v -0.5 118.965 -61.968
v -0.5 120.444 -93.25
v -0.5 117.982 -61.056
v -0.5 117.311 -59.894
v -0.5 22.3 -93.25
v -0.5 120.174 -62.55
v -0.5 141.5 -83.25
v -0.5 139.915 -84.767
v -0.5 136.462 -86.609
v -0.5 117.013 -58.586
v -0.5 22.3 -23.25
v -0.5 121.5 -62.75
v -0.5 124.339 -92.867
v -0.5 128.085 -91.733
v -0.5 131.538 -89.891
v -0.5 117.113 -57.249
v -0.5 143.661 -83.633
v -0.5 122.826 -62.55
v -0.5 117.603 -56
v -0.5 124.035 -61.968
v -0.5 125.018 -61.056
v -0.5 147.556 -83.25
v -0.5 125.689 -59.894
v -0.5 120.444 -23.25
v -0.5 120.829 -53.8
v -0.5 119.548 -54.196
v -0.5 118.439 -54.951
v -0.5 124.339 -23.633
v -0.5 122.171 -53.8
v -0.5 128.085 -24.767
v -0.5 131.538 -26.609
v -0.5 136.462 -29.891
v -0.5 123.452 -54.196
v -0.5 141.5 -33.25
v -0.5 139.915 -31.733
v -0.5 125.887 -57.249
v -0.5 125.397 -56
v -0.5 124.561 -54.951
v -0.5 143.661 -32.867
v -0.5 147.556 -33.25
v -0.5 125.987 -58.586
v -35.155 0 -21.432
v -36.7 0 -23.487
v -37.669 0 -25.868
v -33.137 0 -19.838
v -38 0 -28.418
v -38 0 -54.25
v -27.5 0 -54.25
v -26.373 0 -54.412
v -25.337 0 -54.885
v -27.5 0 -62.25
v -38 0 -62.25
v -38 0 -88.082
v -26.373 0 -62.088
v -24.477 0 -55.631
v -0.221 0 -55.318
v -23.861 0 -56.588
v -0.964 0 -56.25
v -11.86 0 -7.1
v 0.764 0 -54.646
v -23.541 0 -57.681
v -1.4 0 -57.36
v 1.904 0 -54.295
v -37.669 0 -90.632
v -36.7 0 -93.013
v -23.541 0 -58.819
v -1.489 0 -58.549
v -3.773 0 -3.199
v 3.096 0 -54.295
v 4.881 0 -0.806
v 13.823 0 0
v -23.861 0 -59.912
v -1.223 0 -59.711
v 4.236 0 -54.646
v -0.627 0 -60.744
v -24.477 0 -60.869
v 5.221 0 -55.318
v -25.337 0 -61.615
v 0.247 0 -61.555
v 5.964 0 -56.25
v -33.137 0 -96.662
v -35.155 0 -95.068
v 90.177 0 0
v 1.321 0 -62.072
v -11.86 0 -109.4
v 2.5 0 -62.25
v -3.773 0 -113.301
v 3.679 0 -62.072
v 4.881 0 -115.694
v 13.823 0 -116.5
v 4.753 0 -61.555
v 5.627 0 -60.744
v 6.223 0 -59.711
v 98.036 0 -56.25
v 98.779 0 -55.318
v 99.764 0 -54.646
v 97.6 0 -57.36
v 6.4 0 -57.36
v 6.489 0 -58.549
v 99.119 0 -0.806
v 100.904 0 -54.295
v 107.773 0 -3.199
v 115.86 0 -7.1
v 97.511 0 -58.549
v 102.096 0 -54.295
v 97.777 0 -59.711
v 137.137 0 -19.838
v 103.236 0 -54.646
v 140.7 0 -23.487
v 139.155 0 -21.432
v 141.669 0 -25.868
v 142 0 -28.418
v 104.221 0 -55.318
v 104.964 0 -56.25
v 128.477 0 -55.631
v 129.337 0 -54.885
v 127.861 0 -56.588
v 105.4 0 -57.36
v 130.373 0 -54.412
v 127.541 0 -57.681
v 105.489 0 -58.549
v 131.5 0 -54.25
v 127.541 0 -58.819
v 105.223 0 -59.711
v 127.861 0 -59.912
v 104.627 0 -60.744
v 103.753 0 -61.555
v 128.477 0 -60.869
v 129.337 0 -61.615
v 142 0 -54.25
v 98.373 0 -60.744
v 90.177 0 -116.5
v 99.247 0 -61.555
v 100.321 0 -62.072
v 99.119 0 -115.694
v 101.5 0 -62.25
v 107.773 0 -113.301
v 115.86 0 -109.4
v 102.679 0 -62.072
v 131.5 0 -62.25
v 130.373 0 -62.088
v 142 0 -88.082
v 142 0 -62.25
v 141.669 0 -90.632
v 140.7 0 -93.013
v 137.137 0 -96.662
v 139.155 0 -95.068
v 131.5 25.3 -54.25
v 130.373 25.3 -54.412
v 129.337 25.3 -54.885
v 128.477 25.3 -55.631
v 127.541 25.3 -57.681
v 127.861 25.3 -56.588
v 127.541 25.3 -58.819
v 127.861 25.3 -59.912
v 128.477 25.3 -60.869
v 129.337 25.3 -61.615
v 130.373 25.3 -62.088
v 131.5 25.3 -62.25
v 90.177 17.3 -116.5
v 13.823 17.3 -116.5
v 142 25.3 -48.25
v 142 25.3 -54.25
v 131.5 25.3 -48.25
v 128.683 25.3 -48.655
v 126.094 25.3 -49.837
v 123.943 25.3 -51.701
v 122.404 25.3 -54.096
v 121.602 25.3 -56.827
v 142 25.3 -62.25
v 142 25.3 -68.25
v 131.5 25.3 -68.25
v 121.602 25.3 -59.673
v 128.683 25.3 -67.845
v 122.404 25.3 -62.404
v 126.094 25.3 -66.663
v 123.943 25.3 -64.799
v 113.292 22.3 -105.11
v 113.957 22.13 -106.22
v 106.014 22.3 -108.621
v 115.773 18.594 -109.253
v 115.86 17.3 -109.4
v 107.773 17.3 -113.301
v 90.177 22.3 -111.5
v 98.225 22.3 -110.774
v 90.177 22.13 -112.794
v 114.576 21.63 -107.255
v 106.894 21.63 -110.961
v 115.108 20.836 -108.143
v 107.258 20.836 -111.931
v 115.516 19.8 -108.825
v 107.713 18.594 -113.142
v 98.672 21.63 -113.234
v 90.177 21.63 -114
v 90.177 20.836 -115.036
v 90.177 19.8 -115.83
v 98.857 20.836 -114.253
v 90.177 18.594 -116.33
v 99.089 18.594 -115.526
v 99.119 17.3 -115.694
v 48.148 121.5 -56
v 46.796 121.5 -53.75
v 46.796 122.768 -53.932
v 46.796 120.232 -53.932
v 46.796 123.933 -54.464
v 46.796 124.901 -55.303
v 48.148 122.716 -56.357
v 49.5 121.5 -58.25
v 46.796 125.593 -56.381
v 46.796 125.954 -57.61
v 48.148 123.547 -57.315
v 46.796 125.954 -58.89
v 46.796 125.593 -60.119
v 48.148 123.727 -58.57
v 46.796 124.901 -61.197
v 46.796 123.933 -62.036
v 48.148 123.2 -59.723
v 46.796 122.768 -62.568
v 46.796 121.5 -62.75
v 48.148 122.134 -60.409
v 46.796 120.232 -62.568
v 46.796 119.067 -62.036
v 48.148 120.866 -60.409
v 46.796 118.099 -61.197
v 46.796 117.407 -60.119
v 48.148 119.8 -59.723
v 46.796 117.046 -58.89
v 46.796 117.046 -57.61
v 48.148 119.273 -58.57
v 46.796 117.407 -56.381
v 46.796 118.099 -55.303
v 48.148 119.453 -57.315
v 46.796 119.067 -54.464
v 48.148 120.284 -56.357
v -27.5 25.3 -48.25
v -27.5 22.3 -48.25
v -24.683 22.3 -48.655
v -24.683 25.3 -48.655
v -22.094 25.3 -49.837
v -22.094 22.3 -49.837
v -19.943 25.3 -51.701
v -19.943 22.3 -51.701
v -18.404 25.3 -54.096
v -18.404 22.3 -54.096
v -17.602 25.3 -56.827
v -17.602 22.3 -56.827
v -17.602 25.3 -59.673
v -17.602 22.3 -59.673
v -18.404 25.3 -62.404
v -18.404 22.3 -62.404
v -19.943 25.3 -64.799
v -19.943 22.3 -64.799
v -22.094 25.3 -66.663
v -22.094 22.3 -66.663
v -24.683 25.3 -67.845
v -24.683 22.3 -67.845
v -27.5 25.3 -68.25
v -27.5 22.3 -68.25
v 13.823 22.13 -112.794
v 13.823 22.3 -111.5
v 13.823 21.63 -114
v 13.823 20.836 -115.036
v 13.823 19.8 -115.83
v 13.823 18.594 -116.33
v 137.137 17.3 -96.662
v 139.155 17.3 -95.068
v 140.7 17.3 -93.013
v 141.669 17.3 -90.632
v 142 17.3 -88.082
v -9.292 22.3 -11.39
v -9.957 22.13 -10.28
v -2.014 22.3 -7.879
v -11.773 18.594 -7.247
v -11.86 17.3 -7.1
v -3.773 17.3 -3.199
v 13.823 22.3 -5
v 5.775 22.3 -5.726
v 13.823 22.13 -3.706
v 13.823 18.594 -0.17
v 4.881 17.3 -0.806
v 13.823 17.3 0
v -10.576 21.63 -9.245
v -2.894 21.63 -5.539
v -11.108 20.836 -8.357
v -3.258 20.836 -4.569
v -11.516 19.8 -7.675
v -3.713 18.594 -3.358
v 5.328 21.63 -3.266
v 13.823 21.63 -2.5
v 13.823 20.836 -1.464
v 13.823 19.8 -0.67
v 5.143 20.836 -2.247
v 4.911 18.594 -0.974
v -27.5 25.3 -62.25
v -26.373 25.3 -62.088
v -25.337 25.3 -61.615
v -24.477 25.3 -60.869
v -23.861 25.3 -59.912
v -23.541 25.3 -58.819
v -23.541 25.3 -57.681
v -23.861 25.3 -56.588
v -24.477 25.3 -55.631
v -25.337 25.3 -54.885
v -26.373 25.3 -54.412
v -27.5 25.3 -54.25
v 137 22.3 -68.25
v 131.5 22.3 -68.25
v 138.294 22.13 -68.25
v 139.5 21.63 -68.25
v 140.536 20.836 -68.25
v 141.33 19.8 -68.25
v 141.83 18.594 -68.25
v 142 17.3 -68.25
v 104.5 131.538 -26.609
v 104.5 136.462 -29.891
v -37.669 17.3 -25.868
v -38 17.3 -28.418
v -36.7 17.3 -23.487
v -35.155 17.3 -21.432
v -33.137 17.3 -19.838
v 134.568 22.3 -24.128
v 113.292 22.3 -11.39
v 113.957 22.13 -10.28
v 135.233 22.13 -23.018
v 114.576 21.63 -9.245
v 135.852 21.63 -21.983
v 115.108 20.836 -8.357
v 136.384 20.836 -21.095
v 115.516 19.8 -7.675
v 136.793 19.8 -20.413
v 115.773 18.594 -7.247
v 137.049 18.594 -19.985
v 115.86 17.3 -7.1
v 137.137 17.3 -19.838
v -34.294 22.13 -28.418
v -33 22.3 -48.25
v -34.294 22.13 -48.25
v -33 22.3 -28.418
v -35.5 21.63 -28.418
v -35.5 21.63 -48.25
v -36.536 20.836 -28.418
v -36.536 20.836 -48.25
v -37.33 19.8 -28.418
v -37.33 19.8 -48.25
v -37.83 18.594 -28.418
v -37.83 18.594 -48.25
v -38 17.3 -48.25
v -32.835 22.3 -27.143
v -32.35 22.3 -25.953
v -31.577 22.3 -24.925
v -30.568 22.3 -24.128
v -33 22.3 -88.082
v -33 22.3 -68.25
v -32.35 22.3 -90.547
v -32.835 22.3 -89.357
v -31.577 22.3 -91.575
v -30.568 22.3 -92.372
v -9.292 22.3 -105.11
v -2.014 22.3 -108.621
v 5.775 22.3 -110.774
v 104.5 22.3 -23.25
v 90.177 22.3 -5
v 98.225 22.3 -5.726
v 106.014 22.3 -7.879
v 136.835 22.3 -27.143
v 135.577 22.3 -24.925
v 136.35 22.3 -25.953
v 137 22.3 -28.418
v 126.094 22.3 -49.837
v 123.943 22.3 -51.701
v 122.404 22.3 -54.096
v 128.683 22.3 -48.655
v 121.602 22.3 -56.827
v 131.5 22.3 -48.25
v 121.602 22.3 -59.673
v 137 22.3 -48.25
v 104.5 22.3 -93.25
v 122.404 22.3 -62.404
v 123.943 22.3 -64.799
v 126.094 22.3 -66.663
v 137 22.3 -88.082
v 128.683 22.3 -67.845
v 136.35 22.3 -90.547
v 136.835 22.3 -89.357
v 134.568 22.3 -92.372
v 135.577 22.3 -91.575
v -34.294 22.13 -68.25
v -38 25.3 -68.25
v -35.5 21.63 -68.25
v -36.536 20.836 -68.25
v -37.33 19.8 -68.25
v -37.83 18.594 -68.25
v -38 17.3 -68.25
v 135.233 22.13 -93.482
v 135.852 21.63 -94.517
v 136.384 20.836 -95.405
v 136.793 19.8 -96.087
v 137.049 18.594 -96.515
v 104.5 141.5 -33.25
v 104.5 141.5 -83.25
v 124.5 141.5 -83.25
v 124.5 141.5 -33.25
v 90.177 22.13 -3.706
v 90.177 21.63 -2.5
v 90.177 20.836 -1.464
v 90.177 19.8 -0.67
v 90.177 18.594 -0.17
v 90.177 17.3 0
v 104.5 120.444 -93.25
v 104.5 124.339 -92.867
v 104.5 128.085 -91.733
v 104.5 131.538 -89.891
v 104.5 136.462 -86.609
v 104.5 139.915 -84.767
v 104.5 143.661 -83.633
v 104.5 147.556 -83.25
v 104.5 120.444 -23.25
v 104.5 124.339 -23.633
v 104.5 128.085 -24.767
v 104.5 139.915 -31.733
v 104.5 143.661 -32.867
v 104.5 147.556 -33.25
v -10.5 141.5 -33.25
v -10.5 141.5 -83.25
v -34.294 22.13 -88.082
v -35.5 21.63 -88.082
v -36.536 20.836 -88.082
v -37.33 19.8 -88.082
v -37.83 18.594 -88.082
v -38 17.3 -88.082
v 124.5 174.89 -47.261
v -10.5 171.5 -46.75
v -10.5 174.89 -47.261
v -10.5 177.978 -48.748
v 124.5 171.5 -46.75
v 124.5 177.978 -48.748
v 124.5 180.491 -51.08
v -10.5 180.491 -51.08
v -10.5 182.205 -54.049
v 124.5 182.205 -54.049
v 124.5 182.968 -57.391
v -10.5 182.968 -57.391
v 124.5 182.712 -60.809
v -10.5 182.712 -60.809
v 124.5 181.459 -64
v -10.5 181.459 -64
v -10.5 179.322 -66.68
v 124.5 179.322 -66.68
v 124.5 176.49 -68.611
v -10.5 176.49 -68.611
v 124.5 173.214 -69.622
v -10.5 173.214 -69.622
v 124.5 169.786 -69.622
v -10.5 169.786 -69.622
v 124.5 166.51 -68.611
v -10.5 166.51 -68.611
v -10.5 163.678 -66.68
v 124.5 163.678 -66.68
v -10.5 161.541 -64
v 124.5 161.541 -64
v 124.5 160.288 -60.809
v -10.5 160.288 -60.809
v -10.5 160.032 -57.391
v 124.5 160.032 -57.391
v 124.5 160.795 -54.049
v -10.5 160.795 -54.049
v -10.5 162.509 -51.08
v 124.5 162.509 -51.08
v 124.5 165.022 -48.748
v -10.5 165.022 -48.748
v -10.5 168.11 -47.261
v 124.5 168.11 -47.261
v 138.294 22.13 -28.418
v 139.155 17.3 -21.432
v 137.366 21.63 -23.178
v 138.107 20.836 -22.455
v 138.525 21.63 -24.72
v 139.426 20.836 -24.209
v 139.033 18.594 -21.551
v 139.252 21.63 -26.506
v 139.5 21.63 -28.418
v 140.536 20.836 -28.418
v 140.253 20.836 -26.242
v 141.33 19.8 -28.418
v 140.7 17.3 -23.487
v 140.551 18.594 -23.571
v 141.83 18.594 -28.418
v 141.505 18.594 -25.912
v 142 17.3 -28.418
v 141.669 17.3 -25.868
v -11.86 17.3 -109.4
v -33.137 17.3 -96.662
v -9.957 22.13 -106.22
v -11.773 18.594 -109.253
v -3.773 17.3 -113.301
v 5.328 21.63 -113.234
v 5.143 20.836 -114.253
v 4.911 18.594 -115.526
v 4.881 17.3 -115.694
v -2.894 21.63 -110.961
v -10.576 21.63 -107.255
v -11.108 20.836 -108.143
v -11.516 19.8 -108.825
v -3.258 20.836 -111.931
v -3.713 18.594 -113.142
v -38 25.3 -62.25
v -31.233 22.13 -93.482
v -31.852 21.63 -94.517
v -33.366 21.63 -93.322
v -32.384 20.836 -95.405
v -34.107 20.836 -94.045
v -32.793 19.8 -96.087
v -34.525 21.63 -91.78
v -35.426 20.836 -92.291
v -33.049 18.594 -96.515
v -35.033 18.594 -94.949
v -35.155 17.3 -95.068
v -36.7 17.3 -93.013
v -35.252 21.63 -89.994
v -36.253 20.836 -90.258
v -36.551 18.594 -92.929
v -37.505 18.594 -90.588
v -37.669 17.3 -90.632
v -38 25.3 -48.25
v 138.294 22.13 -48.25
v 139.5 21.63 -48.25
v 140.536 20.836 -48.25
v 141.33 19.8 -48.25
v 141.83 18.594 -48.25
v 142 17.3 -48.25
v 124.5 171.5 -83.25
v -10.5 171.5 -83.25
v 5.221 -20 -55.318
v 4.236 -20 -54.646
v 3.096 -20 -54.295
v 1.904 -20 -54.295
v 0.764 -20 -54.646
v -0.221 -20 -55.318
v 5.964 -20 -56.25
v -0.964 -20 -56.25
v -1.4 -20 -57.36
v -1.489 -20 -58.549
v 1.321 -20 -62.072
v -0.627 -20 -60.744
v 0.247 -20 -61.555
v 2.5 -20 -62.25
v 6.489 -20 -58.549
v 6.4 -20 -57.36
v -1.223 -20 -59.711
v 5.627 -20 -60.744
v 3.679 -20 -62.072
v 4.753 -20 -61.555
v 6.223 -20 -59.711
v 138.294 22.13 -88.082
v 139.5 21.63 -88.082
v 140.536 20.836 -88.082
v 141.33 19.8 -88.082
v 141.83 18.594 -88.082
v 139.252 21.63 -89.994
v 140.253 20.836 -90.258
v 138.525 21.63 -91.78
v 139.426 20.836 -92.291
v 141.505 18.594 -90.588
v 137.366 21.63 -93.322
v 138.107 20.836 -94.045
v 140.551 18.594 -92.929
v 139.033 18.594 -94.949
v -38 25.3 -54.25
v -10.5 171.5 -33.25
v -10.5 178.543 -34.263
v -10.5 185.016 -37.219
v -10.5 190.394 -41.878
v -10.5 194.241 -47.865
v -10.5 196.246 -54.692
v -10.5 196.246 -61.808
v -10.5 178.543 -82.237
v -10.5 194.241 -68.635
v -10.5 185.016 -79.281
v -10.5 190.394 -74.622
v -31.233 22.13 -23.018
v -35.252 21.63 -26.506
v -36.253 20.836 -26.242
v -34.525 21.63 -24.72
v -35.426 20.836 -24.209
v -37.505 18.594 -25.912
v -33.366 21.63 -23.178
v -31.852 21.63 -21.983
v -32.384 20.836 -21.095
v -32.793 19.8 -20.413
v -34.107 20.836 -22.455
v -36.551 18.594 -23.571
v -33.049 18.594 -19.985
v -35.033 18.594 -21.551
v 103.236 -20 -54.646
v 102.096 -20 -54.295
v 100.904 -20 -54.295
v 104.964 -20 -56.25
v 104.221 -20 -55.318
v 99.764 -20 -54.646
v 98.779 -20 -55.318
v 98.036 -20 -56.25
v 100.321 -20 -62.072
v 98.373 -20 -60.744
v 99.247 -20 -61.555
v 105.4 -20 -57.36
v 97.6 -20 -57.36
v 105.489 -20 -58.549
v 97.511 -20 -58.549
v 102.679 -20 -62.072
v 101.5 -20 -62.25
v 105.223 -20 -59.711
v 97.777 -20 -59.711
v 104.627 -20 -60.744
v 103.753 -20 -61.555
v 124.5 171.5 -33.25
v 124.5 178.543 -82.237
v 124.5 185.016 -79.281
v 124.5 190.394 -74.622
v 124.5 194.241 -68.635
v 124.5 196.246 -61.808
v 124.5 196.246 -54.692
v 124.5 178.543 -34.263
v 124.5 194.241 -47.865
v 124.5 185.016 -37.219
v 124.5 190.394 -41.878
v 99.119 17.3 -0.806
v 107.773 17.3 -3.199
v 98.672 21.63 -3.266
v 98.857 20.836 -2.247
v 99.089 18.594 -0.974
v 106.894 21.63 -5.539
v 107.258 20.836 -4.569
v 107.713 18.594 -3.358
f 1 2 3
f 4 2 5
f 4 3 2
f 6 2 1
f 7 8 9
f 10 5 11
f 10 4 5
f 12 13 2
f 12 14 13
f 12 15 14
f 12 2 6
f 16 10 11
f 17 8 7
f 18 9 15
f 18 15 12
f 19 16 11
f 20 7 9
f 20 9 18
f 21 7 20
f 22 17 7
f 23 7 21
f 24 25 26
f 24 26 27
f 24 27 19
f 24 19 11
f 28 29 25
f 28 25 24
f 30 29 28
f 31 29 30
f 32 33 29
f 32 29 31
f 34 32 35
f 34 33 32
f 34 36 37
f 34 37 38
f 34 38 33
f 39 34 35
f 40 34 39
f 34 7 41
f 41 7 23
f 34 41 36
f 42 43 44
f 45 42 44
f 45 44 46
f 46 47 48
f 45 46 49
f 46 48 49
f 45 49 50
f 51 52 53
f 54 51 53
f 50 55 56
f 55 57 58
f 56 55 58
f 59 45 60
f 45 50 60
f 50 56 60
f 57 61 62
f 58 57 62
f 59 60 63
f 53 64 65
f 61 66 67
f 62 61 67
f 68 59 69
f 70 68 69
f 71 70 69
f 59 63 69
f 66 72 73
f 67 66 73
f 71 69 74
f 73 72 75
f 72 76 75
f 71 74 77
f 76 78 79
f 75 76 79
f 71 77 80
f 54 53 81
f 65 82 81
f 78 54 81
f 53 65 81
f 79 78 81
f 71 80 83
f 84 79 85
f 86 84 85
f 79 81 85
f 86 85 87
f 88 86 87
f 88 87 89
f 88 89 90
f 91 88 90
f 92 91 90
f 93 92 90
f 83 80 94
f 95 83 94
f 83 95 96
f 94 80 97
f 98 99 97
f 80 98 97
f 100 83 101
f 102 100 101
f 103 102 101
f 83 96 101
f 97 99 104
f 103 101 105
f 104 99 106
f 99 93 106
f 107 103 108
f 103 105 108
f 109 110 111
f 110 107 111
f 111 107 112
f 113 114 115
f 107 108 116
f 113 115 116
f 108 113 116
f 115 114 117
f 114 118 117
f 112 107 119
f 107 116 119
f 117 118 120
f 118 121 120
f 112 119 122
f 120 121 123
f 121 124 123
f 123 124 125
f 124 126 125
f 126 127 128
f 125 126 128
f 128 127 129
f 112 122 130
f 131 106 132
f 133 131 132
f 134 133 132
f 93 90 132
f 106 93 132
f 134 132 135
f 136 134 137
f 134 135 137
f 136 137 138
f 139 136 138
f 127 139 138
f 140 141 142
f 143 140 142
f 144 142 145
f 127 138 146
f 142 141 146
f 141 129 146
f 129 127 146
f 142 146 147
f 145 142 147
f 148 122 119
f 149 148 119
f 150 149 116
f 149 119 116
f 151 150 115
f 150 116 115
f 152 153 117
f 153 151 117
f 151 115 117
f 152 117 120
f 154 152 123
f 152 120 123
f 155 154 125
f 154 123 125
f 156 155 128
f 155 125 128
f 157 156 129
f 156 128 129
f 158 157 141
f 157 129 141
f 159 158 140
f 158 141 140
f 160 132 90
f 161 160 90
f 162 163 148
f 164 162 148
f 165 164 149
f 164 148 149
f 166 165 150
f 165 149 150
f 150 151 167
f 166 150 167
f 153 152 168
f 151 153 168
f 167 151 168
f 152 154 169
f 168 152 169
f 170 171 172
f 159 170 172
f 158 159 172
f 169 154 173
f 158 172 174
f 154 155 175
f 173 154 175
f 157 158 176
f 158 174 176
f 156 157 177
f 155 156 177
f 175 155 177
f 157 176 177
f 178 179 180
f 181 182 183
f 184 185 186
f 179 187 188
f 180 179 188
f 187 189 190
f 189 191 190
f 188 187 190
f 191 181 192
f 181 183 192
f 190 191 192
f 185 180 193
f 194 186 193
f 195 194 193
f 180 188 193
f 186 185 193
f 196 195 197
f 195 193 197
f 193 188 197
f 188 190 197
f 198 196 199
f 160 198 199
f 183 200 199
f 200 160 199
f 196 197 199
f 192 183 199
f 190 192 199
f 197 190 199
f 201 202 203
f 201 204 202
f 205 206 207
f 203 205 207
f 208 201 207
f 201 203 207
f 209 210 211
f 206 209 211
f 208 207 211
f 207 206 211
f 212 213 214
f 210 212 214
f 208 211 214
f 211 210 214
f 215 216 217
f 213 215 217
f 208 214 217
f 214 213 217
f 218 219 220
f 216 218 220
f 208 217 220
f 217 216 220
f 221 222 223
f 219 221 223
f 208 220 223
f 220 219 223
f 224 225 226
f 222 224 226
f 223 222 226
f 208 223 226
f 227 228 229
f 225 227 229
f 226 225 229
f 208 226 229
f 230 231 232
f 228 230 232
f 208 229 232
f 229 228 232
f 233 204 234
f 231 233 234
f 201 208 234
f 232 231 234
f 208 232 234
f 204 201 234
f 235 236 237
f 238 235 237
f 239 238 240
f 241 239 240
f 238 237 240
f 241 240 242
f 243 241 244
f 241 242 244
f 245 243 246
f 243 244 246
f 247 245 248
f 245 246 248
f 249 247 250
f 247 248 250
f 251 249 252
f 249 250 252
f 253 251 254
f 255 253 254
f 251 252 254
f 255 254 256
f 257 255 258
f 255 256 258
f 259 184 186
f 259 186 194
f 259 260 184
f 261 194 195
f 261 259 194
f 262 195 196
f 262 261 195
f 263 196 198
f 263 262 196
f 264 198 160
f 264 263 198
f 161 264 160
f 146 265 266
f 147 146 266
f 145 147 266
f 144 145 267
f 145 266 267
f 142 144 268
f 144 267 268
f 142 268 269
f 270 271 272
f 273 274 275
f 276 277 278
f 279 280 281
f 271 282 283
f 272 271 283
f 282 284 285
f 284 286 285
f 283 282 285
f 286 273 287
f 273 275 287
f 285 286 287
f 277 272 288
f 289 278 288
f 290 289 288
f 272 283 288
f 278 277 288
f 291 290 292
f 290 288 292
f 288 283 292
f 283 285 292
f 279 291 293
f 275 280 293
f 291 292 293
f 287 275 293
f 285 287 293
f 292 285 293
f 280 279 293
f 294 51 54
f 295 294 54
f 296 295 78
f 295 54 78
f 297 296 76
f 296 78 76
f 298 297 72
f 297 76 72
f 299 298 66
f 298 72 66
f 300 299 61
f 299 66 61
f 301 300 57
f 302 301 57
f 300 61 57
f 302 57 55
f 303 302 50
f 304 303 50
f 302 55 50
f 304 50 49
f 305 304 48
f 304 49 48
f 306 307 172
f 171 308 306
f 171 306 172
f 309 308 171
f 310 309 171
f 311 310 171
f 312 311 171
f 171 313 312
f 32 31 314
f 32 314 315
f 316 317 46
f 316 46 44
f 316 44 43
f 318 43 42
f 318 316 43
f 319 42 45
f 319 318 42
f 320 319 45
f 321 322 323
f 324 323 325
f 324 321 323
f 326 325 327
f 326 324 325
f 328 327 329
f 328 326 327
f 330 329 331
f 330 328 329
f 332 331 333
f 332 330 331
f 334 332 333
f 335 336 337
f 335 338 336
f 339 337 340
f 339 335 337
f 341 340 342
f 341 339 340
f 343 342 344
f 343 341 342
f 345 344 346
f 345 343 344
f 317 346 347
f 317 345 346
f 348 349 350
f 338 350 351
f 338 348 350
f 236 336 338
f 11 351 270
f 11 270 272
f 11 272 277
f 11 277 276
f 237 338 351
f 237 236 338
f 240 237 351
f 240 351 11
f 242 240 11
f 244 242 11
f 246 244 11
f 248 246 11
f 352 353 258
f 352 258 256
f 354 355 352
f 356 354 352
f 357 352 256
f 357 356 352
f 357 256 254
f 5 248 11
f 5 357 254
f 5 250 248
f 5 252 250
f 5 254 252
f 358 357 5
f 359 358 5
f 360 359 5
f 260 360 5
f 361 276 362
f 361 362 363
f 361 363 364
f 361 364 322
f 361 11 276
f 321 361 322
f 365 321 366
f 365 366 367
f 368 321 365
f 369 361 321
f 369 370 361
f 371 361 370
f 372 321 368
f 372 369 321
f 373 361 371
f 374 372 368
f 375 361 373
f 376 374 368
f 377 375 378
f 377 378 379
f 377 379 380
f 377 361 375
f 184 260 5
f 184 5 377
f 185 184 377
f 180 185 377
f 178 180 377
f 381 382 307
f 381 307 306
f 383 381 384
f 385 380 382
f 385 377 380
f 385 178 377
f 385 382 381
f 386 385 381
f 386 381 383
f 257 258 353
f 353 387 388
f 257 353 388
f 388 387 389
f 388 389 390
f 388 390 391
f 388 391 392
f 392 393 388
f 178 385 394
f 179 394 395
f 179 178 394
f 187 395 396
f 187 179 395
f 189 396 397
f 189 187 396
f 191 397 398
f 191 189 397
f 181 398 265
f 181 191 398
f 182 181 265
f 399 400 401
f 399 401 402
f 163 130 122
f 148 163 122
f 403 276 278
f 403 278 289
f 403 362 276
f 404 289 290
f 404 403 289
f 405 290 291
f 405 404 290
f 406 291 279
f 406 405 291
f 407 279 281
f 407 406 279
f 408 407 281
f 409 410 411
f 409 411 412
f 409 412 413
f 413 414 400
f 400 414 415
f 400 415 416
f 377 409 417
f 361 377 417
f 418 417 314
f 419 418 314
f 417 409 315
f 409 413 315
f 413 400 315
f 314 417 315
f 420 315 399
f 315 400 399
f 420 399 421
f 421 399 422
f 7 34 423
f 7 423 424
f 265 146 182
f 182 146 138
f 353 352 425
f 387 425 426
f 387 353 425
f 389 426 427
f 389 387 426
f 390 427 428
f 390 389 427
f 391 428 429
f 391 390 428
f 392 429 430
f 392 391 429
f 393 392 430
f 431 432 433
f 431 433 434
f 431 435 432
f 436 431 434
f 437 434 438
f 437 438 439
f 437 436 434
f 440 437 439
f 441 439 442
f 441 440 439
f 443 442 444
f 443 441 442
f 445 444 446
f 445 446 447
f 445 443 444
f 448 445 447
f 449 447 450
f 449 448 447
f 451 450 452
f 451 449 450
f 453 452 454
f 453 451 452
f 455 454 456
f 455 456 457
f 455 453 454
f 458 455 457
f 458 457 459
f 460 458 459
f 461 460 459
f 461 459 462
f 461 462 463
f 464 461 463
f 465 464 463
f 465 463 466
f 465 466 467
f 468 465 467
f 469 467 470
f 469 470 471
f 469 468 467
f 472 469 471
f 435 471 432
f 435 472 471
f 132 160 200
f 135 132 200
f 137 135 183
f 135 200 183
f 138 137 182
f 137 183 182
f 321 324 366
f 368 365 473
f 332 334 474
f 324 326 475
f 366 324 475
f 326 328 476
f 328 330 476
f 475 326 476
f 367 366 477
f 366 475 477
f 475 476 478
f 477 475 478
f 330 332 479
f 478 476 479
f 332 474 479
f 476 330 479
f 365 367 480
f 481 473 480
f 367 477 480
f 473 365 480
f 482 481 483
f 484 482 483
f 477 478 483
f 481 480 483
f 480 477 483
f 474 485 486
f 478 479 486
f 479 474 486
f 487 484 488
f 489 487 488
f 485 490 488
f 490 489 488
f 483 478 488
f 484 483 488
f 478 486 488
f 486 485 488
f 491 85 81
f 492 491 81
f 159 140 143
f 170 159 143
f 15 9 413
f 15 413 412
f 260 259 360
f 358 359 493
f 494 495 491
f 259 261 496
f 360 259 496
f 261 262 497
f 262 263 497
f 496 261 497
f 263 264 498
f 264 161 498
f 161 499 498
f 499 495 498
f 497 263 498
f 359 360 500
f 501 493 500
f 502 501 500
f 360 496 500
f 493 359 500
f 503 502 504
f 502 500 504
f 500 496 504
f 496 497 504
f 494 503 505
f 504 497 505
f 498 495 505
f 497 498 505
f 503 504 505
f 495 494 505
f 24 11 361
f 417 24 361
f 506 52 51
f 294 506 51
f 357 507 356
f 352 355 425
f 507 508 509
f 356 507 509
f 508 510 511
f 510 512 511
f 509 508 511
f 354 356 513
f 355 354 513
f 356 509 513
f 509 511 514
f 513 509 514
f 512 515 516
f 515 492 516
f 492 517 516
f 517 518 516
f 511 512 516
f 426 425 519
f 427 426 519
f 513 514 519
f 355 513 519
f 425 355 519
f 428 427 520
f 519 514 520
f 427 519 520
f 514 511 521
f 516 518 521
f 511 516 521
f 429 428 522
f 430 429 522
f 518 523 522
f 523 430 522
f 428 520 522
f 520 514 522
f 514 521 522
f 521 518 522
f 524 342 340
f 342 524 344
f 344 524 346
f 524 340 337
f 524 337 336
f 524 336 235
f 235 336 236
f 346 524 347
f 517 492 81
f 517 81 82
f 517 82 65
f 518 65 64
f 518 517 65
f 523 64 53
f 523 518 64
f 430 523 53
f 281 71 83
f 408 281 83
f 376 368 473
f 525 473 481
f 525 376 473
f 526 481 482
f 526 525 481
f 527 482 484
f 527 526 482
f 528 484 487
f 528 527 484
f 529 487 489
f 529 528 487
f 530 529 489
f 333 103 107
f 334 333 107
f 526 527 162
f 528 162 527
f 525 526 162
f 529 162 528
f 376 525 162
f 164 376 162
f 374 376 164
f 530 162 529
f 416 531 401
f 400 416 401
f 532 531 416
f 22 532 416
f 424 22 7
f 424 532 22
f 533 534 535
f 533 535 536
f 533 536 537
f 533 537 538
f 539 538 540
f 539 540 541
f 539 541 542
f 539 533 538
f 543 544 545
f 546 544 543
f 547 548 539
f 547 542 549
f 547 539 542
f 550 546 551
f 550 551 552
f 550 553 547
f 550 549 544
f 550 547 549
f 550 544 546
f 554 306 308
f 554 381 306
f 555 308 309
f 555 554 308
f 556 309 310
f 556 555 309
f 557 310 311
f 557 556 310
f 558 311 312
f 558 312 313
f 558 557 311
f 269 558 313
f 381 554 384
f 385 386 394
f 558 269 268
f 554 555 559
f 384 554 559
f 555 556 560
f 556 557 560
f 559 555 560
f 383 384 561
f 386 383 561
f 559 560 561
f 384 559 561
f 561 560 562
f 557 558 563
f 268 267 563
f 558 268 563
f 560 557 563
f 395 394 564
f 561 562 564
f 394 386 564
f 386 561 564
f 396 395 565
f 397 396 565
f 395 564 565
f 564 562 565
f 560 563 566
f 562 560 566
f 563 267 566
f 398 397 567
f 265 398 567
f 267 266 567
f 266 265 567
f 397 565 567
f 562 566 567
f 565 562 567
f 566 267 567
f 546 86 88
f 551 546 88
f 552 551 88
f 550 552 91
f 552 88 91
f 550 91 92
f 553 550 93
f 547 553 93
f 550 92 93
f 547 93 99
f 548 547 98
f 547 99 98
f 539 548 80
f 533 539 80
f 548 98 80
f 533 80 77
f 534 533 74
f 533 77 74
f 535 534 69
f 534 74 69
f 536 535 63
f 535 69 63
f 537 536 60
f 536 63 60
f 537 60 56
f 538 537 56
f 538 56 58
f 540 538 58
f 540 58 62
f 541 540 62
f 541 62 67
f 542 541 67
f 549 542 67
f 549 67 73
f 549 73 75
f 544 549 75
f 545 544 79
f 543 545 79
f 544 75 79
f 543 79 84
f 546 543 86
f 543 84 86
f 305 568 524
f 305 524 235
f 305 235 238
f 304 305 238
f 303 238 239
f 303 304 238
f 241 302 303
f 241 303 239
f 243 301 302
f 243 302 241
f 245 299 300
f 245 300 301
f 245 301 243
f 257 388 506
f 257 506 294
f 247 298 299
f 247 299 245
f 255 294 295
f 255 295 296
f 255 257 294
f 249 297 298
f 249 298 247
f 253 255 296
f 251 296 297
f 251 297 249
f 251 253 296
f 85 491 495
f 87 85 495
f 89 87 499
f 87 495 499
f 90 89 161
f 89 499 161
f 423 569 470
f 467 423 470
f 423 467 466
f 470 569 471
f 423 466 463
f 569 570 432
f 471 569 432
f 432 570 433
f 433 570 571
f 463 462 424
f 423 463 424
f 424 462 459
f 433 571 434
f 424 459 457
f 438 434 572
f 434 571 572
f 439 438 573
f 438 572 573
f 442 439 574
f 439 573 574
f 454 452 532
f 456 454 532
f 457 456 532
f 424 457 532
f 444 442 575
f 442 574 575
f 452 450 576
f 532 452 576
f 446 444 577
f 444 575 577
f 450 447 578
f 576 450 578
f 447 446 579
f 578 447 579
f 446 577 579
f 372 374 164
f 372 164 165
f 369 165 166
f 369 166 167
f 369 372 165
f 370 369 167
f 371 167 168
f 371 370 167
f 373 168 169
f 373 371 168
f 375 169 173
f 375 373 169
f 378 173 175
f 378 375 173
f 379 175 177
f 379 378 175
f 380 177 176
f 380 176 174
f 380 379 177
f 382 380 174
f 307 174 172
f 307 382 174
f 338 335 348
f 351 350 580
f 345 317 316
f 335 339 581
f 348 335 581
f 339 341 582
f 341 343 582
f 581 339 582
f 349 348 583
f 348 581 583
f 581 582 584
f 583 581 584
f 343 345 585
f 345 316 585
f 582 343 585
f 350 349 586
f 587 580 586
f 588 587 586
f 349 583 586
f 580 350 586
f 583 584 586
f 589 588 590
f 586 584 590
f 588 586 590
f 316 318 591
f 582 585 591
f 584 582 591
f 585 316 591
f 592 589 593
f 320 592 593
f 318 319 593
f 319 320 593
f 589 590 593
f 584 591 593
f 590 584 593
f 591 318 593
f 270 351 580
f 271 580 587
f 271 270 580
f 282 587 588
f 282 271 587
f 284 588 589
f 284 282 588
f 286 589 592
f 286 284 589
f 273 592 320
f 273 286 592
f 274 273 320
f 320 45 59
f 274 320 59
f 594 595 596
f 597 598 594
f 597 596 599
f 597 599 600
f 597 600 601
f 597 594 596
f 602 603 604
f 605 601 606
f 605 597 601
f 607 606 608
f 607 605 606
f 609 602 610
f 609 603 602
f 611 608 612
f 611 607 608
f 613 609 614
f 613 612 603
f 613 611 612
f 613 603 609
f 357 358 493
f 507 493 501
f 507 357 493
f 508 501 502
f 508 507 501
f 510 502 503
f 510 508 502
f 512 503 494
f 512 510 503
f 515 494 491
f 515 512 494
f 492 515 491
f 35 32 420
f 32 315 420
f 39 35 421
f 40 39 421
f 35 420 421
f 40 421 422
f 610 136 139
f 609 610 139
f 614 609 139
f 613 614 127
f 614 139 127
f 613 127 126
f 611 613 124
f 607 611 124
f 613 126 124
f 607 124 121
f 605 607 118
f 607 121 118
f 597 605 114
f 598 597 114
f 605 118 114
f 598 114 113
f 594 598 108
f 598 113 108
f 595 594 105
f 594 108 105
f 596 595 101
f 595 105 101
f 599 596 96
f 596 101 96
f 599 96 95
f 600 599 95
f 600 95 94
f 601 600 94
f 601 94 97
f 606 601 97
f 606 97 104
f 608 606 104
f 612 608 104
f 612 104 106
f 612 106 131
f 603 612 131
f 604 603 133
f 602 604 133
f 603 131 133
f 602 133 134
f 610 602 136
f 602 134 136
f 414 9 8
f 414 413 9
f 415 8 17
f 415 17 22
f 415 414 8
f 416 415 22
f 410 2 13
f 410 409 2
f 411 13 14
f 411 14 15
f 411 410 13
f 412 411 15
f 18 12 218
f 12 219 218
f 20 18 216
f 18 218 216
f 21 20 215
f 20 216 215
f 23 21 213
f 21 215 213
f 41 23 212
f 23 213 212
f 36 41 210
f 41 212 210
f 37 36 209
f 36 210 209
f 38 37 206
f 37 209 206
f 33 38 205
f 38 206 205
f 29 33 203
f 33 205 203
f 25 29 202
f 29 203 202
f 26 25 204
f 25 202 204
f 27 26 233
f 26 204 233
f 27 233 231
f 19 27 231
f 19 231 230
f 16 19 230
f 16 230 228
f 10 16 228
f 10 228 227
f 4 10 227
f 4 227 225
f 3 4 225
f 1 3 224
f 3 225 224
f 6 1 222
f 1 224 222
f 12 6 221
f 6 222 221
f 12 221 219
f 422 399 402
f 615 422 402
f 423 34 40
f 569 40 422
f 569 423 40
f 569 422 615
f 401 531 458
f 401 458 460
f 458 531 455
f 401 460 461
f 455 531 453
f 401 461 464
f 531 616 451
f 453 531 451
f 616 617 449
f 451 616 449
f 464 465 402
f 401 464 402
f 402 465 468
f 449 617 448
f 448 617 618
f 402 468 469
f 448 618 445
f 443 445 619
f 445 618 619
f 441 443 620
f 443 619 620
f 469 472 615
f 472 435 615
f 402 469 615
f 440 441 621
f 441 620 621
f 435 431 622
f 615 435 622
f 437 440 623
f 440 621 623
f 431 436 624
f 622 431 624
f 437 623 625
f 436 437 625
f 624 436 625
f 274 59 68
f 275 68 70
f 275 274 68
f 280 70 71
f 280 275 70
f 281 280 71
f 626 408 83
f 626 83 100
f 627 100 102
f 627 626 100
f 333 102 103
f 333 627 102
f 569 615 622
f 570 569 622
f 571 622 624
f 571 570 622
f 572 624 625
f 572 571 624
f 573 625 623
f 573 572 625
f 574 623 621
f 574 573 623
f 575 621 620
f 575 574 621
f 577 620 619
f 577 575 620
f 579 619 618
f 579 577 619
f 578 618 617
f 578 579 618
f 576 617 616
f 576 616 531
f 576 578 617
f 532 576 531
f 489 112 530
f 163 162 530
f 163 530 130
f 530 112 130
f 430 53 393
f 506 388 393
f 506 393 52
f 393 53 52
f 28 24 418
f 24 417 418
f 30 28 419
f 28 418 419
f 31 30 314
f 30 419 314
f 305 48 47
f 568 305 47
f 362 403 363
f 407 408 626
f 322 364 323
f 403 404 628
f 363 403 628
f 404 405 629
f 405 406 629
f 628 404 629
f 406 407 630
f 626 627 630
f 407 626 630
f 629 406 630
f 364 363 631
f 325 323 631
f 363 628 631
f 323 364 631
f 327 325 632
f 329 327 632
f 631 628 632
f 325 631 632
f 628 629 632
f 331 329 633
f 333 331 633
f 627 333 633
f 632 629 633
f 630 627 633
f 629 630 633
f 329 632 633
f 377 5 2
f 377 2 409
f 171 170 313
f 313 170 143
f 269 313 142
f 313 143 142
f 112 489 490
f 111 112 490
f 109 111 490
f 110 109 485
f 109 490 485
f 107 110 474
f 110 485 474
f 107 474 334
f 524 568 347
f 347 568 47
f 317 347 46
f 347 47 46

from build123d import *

# Parameters (mm, degrees)
BASE_DEPTH                    = 22.3
RESALTO_FUROS_DE_FIXA_O_DEPTH = 3
SKETCH4_W                     = 105
SKETCH4_H                     = 70
CORPO_RETANGULAR_DEPTH        = 104.2
CORPO_INCLINADO_DEPTH         = 105
SKETCH5_4_R                   = 11.5
CORPO_ARREDONDADO_BACK_DEPTH  = 10
SKETCH5_5_R                   = 11.5
CORPO_ARREDONDADO_FRONT_DEPTH = 125
SKETCH9_R                     = 4
PINOS_GUIA_DEPTH              = 20
RAIOS_50MM_R                  = 50
RAIOS_20MM_R                  = 20
RAIOS_10MM_R                  = 10
RAIOS_5MM_R                   = 5
FURO_M10X50_D                 = 9
FURO_M10X50_DEPTH             = 47.296127214
FURO_M10X50_TIP               = 2.703872786


with BuildPart() as part:
    # Sketch1 → Base (new body)
    with BuildSketch(Plane(origin=(0, 0, 0), x_dir=(1, 0, 0), z_dir=(0, 1, 0))):
        with BuildLine():
            Line((-27.5, 54.25), (-38, 54.25))
            Line((-38, 54.25), (-38, 22.75))
            Line((-38, 22.75), (0, 0))
            Line((0, 0), (104, 0))
            Line((104, 0), (142, 22.75))
            Line((142, 22.75), (142, 54.25))
            Line((142, 54.25), (131.5, 54.25))
            ThreePointArc((131.5, 54.25), (127.5, 58.25), (131.5, 62.25))
            Line((131.5, 62.25), (142, 62.25))
            Line((142, 62.25), (142, 93.75))
            Line((142, 93.75), (104, 116.5))
            Line((104, 116.5), (0, 116.5))
            Line((0, 116.5), (-38, 93.75))
            Line((-38, 93.75), (-38, 62.25))
            Line((-38, 62.25), (-27.5, 62.25))
            ThreePointArc((-27.5, 62.25), (-23.5, 58.25), (-27.5, 54.25))
        make_face()
    extrude(amount=BASE_DEPTH)

    # Sketch3 → Resalto - Furos de Fixação (add)
    with BuildSketch(Plane(origin=(0, 22.3, 0), x_dir=(1, 0, 0), z_dir=(0, 1, 0))):
        with BuildLine():
            Line((-27.5, 54.25), (-38, 54.25))
            Line((-38, 54.25), (-38, 48.25))
            Line((-38, 48.25), (-27.5, 48.25))
            ThreePointArc((-27.5, 48.25), (-17.5, 58.25), (-27.5, 68.25))
            Line((-27.5, 68.25), (-38, 68.25))
            Line((-38, 68.25), (-38, 62.25))
            Line((-38, 62.25), (-27.5, 62.25))
            ThreePointArc((-27.5, 62.25), (-23.5, 58.25), (-27.5, 54.25))
        make_face()
        with BuildLine():
            Line((142, 54.25), (142, 48.25))
            Line((142, 48.25), (131.5, 48.25))
            ThreePointArc((131.5, 48.25), (121.5, 58.25), (131.5, 68.25))
            Line((131.5, 68.25), (142, 68.25))
            Line((142, 68.25), (142, 62.25))
            Line((142, 62.25), (131.5, 62.25))
            ThreePointArc((131.5, 62.25), (127.5, 58.25), (131.5, 54.25))
            Line((131.5, 54.25), (142, 54.25))
        make_face()
    extrude(amount=RESALTO_FUROS_DE_FIXA_O_DEPTH)

    # Sketch4 → Corpo Retangular (add)
    with BuildSketch(Plane(origin=(0, 22.3, 0), x_dir=(1, 0, 0), z_dir=(0, 1, 0))):
        with Locations((52, 58.25)):
            Rectangle(SKETCH4_W, SKETCH4_H)
    extrude(amount=CORPO_RETANGULAR_DEPTH)

    # Sketch5 → Corpo Inclinado (add)
    with BuildSketch(Plane.ZY.offset(0.5)):
        Polygon((-33.25, 141.5), (-83.25, 141.5), (-93.25, 126.5), (-23.25, 126.5), align=None)
    extrude(amount=-CORPO_INCLINADO_DEPTH)



with BuildPart() as body_2:
    # Sketch5<4> → Corpo Arredondado - Back (new body)
    with BuildSketch(Plane.ZY.offset(0.5)):
        with BuildLine():
            Line((-33.25, 141.5), (-33.25, 171.5))
            ThreePointArc((-33.25, 171.5), (-58.25, 196.5), (-83.25, 171.5))
            Line((-83.25, 171.5), (-83.25, 141.5))
            Line((-83.25, 141.5), (-33.25, 141.5))
        make_face()
        with Locations((-58.25, 171.5)):
            Circle(SKETCH5_4_R, mode=Mode.SUBTRACT)
    extrude(amount=CORPO_ARREDONDADO_BACK_DEPTH)


with BuildPart() as part_1:
    add(part.part)

    add(body_2.part)  # Corpo Arredondado - Front merges body 2
    # Sketch5<5> → Corpo Arredondado - Front (add)
    with BuildSketch(Plane.ZY.offset(0.5)):
        with BuildLine():
            Line((-33.25, 141.5), (-33.25, 171.5))
            ThreePointArc((-33.25, 171.5), (-58.25, 196.5), (-83.25, 171.5))
            Line((-83.25, 171.5), (-83.25, 141.5))
            Line((-83.25, 141.5), (-33.25, 141.5))
        make_face()
        with Locations((-58.25, 171.5)):
            Circle(SKETCH5_5_R, mode=Mode.SUBTRACT)
    extrude(amount=-CORPO_ARREDONDADO_FRONT_DEPTH)

    # Sketch9 → Pinos Guia (add)
    with BuildSketch(Plane.XZ):
        with Locations((2.5, -58.25)):
            Circle(SKETCH9_R)
        with Locations((101.5, -58.25)):
            Circle(SKETCH9_R)
    extrude(amount=PINOS_GUIA_DEPTH)

    # Raios 50mm
    raios_50mm_edges = [part_1.edges().sort_by_distance(p)[0] for p in [
        (0, 11.15, -116.5),
        (104, 11.15, -116.5),
        (0, 11.15, 0),
        (104, 11.15, 0),
    ]]
    fillet(raios_50mm_edges, radius=RAIOS_50MM_R)

    # Raios 20mm
    raios_20mm_edges = [part_1.edges().sort_by_distance(p)[0] for p in [
        (52, 126.5, -93.25),
        (52, 141.5, -83.25),
        (52, 141.5, -33.25),
        (52, 126.5, -23.25),
    ]]
    fillet(raios_20mm_edges, radius=RAIOS_20MM_R)

    # Raios 10mm
    raios_10mm_edges = [part_1.edges().sort_by_distance(p)[0] for p in [
        (-38, 11.15, -93.75),
        (-38, 11.15, -22.75),
        (142, 11.15, -93.75),
        (142, 11.15, -22.75),
    ]]
    fillet(raios_10mm_edges, radius=RAIOS_10MM_R)

    # Raios 5mm
    raios_5mm_edges = [part_1.edges().sort_by_distance(p)[0] for p in [
        (142, 22.3, -78.165851268),
        (140.699613253, 22.3, -93.01290211),
        (126.498390623, 22.3, -103.030568772),
        (103.500210672, 22.3, -114.692200918),
        (-38, 22.3, -78.165851268),
        (-36.699613253, 22.3, -93.01290211),
        (-22.498390623, 22.3, -103.030568772),
        (0.499789328, 22.3, -114.692200918),
        (-38, 22.3, -38.334148732),
        (-36.699613253, 22.3, -23.48709789),
        (-22.498390623, 22.3, -13.469431228),
        (0.499789328, 22.3, -1.807799082),
        (142, 22.3, -38.334148732),
        (140.699613253, 22.3, -23.48709789),
        (126.498390623, 22.3, -13.469431228),
        (103.500210672, 22.3, -1.807799082),
        (52, 22.3, -116.5),
        (52, 22.3, 0),
    ]]
    fillet(raios_5mm_edges, radius=RAIOS_5MM_R)

    # Furo M10x50
    with Locations(Plane.ZY.offset(0.5)):
        with Locations((-58.25, 121.5)):
            Hole(FURO_M10X50_D / 2, depth=FURO_M10X50_DEPTH)
            with Locations((0, 0, -(FURO_M10X50_DEPTH + FURO_M10X50_TIP / 2))):  # 118° drill point
                Cone(0, FURO_M10X50_D / 2, FURO_M10X50_TIP, mode=Mode.SUBTRACT)


solid = part_1.part
